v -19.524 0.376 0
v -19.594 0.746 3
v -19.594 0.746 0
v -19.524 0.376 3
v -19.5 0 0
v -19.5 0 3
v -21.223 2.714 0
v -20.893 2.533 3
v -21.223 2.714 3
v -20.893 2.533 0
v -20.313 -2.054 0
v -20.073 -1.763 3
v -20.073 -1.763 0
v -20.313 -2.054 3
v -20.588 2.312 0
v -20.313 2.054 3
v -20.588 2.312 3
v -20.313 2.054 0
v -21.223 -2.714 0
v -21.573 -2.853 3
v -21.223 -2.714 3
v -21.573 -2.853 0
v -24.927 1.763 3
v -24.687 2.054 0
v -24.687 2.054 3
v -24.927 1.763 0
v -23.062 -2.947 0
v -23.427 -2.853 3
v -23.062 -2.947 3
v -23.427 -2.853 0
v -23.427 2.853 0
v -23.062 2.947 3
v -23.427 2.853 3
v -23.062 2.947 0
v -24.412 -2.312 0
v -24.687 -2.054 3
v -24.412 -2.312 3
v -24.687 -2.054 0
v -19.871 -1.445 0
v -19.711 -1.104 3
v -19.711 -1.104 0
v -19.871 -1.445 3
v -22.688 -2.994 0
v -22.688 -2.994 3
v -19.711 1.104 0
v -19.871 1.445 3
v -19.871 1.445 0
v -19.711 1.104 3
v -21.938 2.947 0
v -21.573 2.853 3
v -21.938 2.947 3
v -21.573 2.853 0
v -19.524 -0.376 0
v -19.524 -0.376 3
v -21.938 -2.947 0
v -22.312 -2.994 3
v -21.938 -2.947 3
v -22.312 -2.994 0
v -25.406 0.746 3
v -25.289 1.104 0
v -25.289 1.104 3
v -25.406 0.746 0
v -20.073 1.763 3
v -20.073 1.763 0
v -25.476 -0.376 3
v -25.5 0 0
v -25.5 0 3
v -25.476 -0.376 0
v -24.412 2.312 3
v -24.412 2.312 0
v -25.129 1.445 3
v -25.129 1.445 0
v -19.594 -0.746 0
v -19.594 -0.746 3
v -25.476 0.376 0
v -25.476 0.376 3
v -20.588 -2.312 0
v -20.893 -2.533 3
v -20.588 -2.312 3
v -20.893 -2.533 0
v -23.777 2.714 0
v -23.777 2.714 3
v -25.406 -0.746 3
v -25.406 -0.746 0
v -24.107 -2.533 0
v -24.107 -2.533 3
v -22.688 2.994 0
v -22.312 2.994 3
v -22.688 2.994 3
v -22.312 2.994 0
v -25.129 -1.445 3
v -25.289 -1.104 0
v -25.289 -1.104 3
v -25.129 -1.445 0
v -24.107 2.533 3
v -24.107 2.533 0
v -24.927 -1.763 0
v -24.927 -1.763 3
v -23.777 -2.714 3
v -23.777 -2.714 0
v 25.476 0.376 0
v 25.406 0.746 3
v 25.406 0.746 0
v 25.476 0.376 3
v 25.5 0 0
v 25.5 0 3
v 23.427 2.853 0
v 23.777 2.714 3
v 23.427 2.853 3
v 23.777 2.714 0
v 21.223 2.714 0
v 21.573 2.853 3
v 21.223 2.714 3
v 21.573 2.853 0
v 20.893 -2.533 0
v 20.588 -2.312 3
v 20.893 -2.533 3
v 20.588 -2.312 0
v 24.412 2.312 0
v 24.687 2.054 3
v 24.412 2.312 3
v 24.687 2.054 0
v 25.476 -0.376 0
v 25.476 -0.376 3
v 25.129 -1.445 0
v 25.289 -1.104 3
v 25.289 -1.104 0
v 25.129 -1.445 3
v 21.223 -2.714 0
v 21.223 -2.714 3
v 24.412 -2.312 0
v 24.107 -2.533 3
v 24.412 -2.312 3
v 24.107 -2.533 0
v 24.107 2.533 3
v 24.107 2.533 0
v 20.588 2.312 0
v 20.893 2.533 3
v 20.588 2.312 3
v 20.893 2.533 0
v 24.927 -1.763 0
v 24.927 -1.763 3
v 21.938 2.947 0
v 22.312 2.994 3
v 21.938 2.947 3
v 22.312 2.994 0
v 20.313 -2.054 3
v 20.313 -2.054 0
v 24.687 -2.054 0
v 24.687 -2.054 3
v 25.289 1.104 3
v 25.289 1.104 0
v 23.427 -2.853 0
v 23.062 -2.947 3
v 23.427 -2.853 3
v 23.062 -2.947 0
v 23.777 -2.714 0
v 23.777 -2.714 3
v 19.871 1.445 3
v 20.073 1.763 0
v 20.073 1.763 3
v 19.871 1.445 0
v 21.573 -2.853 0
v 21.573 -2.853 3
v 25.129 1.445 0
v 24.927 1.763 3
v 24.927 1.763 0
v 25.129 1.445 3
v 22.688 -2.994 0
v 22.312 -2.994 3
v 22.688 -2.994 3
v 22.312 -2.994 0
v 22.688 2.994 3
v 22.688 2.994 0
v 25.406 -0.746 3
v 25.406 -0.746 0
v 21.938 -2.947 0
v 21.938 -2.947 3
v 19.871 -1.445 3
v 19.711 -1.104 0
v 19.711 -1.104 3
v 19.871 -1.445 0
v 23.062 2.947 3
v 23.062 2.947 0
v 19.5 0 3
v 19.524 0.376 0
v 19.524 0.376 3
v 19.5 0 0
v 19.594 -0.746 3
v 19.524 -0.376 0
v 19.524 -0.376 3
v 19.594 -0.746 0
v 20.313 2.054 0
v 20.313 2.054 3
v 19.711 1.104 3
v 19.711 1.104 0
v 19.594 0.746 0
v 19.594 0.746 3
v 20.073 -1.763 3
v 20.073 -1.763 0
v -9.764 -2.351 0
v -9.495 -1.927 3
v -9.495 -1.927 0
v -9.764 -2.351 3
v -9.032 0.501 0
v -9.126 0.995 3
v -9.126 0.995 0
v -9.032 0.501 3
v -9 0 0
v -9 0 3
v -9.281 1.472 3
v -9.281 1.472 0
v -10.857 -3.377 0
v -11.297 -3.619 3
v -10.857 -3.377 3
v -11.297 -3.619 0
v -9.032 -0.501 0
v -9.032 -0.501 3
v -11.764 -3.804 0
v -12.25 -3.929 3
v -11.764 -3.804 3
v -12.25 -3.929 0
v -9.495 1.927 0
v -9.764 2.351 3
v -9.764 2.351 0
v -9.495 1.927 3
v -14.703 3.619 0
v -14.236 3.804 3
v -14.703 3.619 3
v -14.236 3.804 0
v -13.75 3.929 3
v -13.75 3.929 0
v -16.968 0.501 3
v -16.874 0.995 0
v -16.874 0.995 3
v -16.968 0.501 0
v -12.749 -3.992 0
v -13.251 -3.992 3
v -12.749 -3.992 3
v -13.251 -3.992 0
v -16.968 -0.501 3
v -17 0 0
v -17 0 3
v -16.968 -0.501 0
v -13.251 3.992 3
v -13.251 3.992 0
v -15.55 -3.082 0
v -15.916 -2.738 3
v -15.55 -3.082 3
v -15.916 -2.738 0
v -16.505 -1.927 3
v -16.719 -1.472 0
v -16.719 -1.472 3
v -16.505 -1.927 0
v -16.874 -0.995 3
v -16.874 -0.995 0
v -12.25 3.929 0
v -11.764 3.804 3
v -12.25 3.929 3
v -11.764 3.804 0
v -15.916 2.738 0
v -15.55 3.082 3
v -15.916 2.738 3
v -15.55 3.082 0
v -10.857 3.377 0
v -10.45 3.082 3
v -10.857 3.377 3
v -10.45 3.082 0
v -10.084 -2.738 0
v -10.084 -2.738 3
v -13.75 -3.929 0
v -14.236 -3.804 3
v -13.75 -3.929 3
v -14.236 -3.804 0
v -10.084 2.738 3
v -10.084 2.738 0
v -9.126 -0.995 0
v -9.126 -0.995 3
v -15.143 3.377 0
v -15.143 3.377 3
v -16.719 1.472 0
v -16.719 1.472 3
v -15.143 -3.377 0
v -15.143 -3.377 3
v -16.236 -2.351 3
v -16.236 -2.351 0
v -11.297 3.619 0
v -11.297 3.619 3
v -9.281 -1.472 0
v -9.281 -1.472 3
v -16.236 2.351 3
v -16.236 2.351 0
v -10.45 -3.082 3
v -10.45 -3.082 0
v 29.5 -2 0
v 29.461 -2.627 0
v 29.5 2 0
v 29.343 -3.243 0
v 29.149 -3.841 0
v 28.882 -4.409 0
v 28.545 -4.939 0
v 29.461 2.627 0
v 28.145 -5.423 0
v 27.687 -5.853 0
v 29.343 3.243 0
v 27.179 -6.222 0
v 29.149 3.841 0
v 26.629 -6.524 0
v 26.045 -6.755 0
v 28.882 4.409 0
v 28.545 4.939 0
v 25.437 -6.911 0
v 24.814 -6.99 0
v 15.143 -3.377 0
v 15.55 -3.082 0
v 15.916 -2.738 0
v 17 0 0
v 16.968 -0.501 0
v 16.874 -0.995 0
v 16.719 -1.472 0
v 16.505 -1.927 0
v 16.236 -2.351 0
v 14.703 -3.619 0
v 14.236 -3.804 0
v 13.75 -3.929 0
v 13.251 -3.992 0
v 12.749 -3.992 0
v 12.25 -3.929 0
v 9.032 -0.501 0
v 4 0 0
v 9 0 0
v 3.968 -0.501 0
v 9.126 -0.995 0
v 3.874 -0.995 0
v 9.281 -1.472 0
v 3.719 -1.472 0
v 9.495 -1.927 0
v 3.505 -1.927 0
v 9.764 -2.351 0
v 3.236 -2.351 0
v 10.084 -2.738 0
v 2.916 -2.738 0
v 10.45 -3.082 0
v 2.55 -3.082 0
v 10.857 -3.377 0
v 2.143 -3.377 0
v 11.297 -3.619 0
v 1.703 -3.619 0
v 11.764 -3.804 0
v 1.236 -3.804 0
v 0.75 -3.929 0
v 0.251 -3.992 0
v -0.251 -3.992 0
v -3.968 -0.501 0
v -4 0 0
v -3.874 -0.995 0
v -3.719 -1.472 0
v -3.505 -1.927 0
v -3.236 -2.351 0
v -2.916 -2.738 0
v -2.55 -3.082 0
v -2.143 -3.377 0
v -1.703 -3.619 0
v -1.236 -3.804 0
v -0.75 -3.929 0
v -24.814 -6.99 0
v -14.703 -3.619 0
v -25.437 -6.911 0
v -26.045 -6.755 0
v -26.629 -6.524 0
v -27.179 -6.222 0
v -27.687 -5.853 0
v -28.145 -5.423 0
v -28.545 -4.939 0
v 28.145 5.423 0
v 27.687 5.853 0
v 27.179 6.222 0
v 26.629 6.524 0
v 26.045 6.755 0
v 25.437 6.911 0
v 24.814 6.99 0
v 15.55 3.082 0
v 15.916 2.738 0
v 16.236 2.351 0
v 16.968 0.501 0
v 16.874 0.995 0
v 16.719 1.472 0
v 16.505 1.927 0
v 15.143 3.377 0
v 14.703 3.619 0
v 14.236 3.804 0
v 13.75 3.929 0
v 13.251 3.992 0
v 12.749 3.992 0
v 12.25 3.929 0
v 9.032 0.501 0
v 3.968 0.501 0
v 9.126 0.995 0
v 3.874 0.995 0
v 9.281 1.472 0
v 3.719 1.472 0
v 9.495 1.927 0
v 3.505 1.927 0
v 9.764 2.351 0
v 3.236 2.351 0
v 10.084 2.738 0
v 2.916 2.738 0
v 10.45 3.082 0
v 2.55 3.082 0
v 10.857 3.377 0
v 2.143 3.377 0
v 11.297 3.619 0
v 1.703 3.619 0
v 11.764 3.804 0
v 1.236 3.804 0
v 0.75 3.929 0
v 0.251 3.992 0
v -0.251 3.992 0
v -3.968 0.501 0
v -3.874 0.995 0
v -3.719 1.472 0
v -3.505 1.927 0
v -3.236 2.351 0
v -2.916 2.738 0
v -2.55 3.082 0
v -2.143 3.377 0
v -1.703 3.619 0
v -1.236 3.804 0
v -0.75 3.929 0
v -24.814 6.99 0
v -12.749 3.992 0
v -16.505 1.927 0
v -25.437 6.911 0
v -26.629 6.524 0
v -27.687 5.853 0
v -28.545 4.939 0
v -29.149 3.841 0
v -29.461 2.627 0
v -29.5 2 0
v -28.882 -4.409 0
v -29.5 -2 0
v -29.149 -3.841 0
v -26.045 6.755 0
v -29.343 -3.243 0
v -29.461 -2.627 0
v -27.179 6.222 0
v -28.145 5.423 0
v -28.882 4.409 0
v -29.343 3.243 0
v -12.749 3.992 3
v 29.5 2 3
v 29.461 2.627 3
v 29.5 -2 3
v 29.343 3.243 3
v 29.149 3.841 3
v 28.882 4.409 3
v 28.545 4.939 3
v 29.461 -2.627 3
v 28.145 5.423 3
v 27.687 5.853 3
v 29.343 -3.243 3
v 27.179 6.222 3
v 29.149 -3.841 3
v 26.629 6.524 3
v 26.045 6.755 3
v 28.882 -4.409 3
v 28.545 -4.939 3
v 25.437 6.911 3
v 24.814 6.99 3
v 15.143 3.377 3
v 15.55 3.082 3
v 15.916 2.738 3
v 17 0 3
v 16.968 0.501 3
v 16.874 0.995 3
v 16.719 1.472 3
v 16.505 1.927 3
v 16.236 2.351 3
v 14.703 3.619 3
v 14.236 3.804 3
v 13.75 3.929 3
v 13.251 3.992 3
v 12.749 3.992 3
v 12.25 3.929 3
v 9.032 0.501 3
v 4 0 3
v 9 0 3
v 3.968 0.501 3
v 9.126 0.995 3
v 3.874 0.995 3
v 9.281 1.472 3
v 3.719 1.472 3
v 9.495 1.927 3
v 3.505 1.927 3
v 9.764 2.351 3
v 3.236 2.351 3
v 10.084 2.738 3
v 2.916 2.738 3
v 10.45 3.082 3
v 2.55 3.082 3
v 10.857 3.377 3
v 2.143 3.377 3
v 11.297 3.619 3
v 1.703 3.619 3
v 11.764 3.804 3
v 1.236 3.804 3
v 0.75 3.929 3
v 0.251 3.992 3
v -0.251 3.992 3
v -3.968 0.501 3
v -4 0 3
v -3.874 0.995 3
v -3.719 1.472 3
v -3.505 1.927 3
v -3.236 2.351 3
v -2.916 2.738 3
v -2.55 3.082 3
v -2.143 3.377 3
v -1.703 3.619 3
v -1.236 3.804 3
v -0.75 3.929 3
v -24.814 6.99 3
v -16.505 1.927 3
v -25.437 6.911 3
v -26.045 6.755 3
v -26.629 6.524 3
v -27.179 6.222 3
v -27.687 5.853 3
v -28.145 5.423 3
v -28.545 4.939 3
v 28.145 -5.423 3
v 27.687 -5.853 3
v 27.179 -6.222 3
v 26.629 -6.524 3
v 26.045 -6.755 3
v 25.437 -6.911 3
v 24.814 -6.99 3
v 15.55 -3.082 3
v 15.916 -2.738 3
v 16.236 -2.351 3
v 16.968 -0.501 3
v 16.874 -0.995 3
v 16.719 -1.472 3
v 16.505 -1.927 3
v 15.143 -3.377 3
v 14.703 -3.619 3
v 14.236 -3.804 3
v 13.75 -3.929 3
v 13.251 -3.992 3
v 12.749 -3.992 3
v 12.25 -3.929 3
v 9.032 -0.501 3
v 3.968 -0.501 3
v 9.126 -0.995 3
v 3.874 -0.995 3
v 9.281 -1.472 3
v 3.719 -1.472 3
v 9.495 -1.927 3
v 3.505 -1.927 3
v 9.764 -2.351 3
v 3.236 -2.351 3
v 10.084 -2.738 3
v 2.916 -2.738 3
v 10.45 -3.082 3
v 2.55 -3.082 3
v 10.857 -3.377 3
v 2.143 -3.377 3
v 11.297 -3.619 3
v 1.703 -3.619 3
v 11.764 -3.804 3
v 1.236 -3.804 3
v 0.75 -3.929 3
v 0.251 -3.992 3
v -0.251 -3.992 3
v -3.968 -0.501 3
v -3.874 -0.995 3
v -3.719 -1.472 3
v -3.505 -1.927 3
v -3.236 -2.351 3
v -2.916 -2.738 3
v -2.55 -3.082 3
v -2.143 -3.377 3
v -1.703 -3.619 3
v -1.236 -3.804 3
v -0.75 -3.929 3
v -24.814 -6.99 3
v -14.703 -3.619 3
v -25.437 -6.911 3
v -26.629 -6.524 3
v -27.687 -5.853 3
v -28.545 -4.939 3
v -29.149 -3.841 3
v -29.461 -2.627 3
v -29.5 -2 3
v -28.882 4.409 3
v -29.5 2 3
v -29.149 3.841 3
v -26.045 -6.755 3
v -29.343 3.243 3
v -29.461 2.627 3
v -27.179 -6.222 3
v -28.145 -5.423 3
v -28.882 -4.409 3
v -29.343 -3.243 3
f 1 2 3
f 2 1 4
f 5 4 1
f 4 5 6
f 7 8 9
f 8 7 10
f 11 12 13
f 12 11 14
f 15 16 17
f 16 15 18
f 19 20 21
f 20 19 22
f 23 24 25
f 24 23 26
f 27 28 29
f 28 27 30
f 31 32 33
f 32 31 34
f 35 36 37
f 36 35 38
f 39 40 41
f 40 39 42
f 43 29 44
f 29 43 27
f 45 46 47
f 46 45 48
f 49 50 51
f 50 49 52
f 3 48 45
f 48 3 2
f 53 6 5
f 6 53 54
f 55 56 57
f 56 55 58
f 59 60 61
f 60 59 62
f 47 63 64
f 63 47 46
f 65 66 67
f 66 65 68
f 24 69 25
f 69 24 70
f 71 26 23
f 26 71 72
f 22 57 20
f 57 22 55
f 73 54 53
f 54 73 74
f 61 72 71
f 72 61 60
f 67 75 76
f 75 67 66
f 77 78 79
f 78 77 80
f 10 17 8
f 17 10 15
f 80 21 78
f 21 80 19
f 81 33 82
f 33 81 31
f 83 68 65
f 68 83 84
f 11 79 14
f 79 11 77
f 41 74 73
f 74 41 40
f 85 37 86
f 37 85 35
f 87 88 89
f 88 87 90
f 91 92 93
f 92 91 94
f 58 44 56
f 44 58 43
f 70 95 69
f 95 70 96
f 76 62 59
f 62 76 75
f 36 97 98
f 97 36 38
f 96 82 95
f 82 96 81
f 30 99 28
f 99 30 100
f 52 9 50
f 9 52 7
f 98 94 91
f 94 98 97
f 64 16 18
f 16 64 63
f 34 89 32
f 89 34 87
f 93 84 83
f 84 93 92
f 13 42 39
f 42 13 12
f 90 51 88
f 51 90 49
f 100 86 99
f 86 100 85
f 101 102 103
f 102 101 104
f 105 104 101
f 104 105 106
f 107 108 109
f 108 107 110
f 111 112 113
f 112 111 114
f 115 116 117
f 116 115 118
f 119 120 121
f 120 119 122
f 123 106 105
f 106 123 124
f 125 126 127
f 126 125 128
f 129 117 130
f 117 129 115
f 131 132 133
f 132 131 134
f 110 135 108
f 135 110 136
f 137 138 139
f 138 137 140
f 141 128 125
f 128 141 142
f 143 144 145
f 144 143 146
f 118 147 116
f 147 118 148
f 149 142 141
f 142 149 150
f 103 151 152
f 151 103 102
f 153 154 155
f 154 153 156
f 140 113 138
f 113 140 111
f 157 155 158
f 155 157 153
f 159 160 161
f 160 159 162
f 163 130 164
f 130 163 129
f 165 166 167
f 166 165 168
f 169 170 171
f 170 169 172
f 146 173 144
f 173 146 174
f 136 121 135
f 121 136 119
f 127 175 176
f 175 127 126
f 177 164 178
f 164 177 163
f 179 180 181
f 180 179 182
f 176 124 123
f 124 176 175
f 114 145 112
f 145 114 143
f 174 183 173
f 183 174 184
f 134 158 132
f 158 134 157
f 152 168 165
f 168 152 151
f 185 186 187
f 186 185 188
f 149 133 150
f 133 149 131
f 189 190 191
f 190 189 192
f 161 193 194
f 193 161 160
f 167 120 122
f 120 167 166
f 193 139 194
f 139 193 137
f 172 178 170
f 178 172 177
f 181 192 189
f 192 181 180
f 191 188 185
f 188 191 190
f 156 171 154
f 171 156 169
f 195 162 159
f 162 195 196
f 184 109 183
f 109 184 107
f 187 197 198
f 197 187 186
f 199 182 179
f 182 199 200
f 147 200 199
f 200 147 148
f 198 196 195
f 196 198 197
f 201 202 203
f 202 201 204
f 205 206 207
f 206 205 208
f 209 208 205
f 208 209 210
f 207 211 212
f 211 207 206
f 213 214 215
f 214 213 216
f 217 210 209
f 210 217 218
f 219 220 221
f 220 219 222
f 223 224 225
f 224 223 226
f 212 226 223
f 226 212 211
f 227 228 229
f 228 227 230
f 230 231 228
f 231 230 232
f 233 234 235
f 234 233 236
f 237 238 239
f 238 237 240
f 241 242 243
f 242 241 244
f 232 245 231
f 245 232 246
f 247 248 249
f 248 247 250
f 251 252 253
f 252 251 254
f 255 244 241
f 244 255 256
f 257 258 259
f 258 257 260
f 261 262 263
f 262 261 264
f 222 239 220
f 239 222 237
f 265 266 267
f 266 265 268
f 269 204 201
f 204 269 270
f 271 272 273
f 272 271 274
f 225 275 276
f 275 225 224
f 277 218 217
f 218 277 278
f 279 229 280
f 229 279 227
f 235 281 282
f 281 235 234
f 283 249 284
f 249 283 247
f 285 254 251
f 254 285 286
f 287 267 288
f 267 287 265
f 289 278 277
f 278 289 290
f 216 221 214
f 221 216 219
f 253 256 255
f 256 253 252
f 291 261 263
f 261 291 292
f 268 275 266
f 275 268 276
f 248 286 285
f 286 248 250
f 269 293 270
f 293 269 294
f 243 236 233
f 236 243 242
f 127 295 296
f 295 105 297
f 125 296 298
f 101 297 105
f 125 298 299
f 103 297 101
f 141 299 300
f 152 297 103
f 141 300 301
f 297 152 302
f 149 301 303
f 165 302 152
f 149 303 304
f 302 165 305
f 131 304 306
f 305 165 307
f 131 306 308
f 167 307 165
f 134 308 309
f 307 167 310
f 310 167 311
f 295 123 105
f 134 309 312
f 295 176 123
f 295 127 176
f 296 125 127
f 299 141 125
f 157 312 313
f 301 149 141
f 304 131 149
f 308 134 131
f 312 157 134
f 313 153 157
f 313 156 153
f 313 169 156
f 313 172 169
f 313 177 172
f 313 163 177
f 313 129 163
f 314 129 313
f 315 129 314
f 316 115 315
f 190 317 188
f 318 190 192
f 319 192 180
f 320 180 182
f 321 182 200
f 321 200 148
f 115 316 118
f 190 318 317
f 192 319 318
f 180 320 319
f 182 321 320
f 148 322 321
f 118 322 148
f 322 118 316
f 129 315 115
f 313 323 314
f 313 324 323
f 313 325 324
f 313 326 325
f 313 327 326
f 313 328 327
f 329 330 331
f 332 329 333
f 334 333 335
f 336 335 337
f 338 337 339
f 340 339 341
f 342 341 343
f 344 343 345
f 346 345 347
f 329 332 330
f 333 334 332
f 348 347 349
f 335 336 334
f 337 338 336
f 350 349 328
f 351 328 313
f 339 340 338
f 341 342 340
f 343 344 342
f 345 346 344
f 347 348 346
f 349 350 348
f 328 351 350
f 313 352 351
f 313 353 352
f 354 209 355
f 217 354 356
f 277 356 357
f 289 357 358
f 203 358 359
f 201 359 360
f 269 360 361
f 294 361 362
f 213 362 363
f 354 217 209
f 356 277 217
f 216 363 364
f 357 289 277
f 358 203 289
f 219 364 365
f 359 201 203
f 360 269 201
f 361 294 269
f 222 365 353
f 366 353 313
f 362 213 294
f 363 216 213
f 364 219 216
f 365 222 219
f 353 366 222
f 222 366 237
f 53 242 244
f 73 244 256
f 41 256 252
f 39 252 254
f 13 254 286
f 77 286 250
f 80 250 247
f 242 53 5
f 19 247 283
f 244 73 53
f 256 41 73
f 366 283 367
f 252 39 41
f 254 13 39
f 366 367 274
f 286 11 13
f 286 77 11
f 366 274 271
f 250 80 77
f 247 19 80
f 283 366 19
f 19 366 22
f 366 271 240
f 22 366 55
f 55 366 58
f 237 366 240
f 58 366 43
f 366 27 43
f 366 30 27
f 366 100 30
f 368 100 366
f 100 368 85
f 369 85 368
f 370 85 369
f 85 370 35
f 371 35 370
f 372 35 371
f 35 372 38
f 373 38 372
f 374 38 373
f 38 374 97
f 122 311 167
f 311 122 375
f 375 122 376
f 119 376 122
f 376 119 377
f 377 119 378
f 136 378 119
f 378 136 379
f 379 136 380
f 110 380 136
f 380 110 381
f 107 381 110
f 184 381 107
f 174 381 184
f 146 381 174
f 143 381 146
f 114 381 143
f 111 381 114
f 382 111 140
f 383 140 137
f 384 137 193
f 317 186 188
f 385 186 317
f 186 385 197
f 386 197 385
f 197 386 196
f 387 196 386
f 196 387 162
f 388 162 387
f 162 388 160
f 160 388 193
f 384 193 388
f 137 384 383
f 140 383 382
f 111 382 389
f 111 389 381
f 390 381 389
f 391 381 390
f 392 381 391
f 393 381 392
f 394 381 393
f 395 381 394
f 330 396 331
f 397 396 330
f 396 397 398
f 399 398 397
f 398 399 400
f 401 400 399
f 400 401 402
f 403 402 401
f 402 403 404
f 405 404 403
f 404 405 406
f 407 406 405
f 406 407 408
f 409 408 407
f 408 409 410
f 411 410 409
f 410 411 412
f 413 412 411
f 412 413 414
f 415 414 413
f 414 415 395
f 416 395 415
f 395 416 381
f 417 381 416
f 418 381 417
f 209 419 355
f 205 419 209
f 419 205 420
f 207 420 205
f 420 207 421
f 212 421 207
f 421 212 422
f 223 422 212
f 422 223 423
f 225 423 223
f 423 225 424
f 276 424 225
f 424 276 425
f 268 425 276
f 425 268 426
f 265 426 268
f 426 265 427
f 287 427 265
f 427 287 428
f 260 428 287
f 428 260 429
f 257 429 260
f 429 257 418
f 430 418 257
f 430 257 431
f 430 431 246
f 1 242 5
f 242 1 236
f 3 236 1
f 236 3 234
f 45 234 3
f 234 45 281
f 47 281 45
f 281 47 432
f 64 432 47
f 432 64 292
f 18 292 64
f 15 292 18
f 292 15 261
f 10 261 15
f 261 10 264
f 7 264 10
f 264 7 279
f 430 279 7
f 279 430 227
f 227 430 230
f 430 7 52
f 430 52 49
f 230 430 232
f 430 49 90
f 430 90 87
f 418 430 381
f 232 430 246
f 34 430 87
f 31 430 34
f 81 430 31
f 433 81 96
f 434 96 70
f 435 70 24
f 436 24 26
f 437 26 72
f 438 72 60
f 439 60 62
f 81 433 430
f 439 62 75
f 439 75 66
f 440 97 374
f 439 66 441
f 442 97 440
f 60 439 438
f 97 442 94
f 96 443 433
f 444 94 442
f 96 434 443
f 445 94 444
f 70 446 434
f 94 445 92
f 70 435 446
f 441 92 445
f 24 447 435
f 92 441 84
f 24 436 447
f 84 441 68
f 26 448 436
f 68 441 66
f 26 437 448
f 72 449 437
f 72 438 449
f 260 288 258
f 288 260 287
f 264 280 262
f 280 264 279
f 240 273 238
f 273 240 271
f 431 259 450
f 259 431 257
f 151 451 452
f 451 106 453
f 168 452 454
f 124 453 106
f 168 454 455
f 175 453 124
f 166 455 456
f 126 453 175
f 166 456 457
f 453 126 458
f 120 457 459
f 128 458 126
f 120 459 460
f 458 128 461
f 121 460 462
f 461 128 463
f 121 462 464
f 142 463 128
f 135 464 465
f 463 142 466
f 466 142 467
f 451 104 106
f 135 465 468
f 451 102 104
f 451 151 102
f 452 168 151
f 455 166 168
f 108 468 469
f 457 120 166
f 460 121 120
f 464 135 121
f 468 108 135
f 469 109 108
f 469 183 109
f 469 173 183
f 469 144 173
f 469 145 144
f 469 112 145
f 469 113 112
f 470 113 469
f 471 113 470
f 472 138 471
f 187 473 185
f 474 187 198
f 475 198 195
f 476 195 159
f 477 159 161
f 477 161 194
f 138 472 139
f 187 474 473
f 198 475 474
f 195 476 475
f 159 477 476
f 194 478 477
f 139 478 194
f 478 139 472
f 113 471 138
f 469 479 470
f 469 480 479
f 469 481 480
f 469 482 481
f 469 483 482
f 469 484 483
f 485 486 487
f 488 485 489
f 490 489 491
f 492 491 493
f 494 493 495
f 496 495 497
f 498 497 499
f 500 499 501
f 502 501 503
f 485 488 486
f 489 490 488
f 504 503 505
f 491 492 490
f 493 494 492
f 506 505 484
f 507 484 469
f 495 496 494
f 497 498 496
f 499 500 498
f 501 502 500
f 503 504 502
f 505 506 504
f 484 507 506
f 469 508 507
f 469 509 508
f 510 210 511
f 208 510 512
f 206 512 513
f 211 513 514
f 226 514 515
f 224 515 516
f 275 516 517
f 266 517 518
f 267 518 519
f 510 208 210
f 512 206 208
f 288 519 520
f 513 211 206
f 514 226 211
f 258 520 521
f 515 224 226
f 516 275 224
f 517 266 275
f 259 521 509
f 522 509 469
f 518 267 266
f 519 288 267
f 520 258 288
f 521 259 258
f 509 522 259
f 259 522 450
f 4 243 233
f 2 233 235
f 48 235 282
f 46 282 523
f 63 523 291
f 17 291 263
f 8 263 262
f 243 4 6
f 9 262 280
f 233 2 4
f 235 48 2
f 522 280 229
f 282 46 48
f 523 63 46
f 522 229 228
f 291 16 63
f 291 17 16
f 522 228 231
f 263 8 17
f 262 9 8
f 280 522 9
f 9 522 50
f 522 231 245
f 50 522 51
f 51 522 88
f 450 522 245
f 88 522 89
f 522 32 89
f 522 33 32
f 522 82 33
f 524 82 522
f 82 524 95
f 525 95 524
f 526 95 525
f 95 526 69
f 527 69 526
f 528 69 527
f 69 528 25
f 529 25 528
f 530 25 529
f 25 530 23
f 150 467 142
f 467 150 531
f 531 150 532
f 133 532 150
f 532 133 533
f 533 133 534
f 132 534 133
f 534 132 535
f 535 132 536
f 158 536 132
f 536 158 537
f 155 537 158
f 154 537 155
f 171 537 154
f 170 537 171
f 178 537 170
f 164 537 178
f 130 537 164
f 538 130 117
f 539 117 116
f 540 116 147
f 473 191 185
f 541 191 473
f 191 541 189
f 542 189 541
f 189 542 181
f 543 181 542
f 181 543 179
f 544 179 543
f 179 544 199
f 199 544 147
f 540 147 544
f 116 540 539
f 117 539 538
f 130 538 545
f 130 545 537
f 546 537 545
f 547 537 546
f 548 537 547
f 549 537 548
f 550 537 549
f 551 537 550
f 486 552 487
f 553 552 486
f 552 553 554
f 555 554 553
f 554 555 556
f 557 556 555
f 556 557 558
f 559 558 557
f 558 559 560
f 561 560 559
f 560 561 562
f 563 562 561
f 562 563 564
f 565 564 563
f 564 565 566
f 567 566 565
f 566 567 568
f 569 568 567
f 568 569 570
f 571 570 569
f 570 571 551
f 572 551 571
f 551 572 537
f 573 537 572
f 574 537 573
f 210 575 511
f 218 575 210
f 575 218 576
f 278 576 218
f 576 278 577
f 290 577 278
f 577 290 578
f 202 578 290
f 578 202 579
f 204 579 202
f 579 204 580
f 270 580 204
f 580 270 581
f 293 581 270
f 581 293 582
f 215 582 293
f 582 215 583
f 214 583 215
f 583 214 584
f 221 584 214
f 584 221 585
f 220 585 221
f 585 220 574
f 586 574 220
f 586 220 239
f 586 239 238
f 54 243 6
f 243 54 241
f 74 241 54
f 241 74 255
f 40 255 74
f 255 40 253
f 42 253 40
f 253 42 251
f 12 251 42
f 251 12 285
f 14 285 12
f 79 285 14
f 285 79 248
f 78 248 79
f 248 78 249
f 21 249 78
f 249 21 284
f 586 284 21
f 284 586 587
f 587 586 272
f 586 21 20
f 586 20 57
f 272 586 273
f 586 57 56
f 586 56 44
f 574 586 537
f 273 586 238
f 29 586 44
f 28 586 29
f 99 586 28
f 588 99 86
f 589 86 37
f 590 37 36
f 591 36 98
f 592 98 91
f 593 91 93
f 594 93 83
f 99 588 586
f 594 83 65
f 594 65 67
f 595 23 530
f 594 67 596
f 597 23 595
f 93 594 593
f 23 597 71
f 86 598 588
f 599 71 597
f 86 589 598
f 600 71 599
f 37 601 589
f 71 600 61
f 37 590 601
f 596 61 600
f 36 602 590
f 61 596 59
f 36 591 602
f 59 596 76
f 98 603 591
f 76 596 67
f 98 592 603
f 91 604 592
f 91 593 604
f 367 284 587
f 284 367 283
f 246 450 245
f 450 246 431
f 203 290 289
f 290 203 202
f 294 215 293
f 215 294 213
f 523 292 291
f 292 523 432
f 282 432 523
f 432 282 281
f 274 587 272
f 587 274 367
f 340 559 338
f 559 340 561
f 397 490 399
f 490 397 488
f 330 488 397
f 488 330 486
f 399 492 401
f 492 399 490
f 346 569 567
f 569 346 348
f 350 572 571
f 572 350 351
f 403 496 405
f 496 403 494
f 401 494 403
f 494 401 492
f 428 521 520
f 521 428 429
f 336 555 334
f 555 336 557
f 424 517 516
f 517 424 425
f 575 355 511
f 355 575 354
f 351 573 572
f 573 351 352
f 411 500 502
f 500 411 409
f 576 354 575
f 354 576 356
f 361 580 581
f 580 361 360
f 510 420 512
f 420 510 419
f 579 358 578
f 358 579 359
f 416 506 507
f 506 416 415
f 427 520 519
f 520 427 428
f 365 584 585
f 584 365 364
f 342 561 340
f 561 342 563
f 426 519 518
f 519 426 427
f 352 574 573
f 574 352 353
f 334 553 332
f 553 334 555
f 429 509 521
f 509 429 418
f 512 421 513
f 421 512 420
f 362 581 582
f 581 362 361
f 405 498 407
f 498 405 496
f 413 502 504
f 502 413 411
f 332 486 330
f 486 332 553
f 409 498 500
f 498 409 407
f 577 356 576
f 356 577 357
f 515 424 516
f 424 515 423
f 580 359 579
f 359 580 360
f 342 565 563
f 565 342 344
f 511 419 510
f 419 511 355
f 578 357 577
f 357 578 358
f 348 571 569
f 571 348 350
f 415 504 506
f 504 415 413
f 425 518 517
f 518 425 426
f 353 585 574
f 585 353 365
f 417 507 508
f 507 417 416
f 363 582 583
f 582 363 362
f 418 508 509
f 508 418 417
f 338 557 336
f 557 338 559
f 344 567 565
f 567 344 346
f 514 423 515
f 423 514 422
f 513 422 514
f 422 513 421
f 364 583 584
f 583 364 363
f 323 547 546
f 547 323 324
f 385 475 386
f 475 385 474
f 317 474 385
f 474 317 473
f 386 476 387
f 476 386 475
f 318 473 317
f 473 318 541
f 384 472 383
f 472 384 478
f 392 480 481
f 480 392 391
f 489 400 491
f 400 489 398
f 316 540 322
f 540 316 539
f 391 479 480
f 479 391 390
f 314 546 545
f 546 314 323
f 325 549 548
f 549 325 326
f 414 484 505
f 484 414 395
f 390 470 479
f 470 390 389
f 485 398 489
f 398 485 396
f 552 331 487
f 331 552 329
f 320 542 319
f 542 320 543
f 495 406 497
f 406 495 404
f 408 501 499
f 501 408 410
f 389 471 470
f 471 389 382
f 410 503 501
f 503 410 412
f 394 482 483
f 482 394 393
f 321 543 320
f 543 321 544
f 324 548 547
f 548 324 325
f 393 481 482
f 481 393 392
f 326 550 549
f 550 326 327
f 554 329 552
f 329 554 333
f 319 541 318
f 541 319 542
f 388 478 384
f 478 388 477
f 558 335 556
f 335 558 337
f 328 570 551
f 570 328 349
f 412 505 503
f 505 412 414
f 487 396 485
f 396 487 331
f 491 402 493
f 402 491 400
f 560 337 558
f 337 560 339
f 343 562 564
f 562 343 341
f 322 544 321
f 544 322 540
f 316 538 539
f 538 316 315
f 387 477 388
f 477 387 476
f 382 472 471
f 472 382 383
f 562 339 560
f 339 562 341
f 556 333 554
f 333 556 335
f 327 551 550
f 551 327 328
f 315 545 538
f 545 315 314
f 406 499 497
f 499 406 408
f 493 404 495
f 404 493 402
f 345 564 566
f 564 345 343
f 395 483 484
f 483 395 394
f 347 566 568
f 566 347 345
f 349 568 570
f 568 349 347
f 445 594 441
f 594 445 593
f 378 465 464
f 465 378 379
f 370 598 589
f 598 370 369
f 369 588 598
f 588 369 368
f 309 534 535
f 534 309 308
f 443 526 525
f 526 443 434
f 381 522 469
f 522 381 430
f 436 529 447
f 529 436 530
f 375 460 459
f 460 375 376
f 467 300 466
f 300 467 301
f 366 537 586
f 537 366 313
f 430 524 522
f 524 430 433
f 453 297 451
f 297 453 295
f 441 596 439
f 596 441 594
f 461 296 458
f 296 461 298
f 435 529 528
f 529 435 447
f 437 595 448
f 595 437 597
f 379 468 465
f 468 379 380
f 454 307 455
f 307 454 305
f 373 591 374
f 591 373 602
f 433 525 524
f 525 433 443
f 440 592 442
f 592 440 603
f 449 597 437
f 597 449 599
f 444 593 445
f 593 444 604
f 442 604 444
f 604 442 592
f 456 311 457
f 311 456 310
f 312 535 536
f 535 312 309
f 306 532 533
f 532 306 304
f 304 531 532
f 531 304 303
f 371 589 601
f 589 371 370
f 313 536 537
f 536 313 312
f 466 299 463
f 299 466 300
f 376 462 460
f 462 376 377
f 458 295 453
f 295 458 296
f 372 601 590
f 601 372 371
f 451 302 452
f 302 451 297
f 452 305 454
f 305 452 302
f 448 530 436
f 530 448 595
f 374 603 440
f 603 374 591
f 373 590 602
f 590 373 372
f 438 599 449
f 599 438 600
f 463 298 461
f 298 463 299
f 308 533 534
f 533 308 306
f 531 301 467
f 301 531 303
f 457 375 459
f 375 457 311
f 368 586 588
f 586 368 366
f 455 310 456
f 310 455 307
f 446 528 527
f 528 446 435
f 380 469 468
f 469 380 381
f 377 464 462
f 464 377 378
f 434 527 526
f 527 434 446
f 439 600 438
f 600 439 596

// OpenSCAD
$fn = 50;


difference() {
	union() {
		hull() {
			translate(v = [-24.5000000000, 2.0000000000, 0]) {
				cylinder(h = 3, r = 5);
			}
			translate(v = [24.5000000000, 2.0000000000, 0]) {
				cylinder(h = 3, r = 5);
			}
			translate(v = [-24.5000000000, -2.0000000000, 0]) {
				cylinder(h = 3, r = 5);
			}
			translate(v = [24.5000000000, -2.0000000000, 0]) {
				cylinder(h = 3, r = 5);
			}
		}
	}
	union() {
		#translate(v = [-22.5000000000, 0.0000000000, 0]) {
			cylinder(h = 3, r = 3.0000000000);
		}
		#translate(v = [22.5000000000, 0.0000000000, 0]) {
			cylinder(h = 3, r = 3.0000000000);
		}
		#translate(v = [-22.5000000000, 0.0000000000, -100.0000000000]) {
			cylinder(h = 200, r = 3.0000000000);
		}
		#translate(v = [-22.5000000000, 0.0000000000, -100.0000000000]) {
			cylinder(h = 200, r = 3.0000000000);
		}
		#translate(v = [22.5000000000, 0.0000000000, -100.0000000000]) {
			cylinder(h = 200, r = 3.0000000000);
		}
		#translate(v = [22.5000000000, 0.0000000000, -100.0000000000]) {
			cylinder(h = 200, r = 3.0000000000);
		}
		#translate(v = [-22.5000000000, 0.0000000000, 0]) {
			cylinder(h = 3, r = 1.5000000000);
		}
		#translate(v = [22.5000000000, 0.0000000000, 0]) {
			cylinder(h = 3, r = 1.5000000000);
		}
		#translate(v = [-22.5000000000, 0.0000000000, 0]) {
			cylinder(h = 3, r = 1.5000000000);
		}
		#translate(v = [22.5000000000, 0.0000000000, 0]) {
			cylinder(h = 3, r = 1.5000000000);
		}
		#translate(v = [-22.5000000000, 0.0000000000, 0]) {
			cylinder(h = 3, r = 1.5000000000);
		}
		#translate(v = [22.5000000000, 0.0000000000, 0]) {
			cylinder(h = 3, r = 1.5000000000);
		}
		#translate(v = [-13.0000000000, 0, 0]) {
			cylinder(h = 3, r = 4.0000000000);
		}
		#cylinder(h = 3, r = 4.0000000000);
		#translate(v = [13.0000000000, 0, 0]) {
			cylinder(h = 3, r = 4.0000000000);
		}
	}
}
